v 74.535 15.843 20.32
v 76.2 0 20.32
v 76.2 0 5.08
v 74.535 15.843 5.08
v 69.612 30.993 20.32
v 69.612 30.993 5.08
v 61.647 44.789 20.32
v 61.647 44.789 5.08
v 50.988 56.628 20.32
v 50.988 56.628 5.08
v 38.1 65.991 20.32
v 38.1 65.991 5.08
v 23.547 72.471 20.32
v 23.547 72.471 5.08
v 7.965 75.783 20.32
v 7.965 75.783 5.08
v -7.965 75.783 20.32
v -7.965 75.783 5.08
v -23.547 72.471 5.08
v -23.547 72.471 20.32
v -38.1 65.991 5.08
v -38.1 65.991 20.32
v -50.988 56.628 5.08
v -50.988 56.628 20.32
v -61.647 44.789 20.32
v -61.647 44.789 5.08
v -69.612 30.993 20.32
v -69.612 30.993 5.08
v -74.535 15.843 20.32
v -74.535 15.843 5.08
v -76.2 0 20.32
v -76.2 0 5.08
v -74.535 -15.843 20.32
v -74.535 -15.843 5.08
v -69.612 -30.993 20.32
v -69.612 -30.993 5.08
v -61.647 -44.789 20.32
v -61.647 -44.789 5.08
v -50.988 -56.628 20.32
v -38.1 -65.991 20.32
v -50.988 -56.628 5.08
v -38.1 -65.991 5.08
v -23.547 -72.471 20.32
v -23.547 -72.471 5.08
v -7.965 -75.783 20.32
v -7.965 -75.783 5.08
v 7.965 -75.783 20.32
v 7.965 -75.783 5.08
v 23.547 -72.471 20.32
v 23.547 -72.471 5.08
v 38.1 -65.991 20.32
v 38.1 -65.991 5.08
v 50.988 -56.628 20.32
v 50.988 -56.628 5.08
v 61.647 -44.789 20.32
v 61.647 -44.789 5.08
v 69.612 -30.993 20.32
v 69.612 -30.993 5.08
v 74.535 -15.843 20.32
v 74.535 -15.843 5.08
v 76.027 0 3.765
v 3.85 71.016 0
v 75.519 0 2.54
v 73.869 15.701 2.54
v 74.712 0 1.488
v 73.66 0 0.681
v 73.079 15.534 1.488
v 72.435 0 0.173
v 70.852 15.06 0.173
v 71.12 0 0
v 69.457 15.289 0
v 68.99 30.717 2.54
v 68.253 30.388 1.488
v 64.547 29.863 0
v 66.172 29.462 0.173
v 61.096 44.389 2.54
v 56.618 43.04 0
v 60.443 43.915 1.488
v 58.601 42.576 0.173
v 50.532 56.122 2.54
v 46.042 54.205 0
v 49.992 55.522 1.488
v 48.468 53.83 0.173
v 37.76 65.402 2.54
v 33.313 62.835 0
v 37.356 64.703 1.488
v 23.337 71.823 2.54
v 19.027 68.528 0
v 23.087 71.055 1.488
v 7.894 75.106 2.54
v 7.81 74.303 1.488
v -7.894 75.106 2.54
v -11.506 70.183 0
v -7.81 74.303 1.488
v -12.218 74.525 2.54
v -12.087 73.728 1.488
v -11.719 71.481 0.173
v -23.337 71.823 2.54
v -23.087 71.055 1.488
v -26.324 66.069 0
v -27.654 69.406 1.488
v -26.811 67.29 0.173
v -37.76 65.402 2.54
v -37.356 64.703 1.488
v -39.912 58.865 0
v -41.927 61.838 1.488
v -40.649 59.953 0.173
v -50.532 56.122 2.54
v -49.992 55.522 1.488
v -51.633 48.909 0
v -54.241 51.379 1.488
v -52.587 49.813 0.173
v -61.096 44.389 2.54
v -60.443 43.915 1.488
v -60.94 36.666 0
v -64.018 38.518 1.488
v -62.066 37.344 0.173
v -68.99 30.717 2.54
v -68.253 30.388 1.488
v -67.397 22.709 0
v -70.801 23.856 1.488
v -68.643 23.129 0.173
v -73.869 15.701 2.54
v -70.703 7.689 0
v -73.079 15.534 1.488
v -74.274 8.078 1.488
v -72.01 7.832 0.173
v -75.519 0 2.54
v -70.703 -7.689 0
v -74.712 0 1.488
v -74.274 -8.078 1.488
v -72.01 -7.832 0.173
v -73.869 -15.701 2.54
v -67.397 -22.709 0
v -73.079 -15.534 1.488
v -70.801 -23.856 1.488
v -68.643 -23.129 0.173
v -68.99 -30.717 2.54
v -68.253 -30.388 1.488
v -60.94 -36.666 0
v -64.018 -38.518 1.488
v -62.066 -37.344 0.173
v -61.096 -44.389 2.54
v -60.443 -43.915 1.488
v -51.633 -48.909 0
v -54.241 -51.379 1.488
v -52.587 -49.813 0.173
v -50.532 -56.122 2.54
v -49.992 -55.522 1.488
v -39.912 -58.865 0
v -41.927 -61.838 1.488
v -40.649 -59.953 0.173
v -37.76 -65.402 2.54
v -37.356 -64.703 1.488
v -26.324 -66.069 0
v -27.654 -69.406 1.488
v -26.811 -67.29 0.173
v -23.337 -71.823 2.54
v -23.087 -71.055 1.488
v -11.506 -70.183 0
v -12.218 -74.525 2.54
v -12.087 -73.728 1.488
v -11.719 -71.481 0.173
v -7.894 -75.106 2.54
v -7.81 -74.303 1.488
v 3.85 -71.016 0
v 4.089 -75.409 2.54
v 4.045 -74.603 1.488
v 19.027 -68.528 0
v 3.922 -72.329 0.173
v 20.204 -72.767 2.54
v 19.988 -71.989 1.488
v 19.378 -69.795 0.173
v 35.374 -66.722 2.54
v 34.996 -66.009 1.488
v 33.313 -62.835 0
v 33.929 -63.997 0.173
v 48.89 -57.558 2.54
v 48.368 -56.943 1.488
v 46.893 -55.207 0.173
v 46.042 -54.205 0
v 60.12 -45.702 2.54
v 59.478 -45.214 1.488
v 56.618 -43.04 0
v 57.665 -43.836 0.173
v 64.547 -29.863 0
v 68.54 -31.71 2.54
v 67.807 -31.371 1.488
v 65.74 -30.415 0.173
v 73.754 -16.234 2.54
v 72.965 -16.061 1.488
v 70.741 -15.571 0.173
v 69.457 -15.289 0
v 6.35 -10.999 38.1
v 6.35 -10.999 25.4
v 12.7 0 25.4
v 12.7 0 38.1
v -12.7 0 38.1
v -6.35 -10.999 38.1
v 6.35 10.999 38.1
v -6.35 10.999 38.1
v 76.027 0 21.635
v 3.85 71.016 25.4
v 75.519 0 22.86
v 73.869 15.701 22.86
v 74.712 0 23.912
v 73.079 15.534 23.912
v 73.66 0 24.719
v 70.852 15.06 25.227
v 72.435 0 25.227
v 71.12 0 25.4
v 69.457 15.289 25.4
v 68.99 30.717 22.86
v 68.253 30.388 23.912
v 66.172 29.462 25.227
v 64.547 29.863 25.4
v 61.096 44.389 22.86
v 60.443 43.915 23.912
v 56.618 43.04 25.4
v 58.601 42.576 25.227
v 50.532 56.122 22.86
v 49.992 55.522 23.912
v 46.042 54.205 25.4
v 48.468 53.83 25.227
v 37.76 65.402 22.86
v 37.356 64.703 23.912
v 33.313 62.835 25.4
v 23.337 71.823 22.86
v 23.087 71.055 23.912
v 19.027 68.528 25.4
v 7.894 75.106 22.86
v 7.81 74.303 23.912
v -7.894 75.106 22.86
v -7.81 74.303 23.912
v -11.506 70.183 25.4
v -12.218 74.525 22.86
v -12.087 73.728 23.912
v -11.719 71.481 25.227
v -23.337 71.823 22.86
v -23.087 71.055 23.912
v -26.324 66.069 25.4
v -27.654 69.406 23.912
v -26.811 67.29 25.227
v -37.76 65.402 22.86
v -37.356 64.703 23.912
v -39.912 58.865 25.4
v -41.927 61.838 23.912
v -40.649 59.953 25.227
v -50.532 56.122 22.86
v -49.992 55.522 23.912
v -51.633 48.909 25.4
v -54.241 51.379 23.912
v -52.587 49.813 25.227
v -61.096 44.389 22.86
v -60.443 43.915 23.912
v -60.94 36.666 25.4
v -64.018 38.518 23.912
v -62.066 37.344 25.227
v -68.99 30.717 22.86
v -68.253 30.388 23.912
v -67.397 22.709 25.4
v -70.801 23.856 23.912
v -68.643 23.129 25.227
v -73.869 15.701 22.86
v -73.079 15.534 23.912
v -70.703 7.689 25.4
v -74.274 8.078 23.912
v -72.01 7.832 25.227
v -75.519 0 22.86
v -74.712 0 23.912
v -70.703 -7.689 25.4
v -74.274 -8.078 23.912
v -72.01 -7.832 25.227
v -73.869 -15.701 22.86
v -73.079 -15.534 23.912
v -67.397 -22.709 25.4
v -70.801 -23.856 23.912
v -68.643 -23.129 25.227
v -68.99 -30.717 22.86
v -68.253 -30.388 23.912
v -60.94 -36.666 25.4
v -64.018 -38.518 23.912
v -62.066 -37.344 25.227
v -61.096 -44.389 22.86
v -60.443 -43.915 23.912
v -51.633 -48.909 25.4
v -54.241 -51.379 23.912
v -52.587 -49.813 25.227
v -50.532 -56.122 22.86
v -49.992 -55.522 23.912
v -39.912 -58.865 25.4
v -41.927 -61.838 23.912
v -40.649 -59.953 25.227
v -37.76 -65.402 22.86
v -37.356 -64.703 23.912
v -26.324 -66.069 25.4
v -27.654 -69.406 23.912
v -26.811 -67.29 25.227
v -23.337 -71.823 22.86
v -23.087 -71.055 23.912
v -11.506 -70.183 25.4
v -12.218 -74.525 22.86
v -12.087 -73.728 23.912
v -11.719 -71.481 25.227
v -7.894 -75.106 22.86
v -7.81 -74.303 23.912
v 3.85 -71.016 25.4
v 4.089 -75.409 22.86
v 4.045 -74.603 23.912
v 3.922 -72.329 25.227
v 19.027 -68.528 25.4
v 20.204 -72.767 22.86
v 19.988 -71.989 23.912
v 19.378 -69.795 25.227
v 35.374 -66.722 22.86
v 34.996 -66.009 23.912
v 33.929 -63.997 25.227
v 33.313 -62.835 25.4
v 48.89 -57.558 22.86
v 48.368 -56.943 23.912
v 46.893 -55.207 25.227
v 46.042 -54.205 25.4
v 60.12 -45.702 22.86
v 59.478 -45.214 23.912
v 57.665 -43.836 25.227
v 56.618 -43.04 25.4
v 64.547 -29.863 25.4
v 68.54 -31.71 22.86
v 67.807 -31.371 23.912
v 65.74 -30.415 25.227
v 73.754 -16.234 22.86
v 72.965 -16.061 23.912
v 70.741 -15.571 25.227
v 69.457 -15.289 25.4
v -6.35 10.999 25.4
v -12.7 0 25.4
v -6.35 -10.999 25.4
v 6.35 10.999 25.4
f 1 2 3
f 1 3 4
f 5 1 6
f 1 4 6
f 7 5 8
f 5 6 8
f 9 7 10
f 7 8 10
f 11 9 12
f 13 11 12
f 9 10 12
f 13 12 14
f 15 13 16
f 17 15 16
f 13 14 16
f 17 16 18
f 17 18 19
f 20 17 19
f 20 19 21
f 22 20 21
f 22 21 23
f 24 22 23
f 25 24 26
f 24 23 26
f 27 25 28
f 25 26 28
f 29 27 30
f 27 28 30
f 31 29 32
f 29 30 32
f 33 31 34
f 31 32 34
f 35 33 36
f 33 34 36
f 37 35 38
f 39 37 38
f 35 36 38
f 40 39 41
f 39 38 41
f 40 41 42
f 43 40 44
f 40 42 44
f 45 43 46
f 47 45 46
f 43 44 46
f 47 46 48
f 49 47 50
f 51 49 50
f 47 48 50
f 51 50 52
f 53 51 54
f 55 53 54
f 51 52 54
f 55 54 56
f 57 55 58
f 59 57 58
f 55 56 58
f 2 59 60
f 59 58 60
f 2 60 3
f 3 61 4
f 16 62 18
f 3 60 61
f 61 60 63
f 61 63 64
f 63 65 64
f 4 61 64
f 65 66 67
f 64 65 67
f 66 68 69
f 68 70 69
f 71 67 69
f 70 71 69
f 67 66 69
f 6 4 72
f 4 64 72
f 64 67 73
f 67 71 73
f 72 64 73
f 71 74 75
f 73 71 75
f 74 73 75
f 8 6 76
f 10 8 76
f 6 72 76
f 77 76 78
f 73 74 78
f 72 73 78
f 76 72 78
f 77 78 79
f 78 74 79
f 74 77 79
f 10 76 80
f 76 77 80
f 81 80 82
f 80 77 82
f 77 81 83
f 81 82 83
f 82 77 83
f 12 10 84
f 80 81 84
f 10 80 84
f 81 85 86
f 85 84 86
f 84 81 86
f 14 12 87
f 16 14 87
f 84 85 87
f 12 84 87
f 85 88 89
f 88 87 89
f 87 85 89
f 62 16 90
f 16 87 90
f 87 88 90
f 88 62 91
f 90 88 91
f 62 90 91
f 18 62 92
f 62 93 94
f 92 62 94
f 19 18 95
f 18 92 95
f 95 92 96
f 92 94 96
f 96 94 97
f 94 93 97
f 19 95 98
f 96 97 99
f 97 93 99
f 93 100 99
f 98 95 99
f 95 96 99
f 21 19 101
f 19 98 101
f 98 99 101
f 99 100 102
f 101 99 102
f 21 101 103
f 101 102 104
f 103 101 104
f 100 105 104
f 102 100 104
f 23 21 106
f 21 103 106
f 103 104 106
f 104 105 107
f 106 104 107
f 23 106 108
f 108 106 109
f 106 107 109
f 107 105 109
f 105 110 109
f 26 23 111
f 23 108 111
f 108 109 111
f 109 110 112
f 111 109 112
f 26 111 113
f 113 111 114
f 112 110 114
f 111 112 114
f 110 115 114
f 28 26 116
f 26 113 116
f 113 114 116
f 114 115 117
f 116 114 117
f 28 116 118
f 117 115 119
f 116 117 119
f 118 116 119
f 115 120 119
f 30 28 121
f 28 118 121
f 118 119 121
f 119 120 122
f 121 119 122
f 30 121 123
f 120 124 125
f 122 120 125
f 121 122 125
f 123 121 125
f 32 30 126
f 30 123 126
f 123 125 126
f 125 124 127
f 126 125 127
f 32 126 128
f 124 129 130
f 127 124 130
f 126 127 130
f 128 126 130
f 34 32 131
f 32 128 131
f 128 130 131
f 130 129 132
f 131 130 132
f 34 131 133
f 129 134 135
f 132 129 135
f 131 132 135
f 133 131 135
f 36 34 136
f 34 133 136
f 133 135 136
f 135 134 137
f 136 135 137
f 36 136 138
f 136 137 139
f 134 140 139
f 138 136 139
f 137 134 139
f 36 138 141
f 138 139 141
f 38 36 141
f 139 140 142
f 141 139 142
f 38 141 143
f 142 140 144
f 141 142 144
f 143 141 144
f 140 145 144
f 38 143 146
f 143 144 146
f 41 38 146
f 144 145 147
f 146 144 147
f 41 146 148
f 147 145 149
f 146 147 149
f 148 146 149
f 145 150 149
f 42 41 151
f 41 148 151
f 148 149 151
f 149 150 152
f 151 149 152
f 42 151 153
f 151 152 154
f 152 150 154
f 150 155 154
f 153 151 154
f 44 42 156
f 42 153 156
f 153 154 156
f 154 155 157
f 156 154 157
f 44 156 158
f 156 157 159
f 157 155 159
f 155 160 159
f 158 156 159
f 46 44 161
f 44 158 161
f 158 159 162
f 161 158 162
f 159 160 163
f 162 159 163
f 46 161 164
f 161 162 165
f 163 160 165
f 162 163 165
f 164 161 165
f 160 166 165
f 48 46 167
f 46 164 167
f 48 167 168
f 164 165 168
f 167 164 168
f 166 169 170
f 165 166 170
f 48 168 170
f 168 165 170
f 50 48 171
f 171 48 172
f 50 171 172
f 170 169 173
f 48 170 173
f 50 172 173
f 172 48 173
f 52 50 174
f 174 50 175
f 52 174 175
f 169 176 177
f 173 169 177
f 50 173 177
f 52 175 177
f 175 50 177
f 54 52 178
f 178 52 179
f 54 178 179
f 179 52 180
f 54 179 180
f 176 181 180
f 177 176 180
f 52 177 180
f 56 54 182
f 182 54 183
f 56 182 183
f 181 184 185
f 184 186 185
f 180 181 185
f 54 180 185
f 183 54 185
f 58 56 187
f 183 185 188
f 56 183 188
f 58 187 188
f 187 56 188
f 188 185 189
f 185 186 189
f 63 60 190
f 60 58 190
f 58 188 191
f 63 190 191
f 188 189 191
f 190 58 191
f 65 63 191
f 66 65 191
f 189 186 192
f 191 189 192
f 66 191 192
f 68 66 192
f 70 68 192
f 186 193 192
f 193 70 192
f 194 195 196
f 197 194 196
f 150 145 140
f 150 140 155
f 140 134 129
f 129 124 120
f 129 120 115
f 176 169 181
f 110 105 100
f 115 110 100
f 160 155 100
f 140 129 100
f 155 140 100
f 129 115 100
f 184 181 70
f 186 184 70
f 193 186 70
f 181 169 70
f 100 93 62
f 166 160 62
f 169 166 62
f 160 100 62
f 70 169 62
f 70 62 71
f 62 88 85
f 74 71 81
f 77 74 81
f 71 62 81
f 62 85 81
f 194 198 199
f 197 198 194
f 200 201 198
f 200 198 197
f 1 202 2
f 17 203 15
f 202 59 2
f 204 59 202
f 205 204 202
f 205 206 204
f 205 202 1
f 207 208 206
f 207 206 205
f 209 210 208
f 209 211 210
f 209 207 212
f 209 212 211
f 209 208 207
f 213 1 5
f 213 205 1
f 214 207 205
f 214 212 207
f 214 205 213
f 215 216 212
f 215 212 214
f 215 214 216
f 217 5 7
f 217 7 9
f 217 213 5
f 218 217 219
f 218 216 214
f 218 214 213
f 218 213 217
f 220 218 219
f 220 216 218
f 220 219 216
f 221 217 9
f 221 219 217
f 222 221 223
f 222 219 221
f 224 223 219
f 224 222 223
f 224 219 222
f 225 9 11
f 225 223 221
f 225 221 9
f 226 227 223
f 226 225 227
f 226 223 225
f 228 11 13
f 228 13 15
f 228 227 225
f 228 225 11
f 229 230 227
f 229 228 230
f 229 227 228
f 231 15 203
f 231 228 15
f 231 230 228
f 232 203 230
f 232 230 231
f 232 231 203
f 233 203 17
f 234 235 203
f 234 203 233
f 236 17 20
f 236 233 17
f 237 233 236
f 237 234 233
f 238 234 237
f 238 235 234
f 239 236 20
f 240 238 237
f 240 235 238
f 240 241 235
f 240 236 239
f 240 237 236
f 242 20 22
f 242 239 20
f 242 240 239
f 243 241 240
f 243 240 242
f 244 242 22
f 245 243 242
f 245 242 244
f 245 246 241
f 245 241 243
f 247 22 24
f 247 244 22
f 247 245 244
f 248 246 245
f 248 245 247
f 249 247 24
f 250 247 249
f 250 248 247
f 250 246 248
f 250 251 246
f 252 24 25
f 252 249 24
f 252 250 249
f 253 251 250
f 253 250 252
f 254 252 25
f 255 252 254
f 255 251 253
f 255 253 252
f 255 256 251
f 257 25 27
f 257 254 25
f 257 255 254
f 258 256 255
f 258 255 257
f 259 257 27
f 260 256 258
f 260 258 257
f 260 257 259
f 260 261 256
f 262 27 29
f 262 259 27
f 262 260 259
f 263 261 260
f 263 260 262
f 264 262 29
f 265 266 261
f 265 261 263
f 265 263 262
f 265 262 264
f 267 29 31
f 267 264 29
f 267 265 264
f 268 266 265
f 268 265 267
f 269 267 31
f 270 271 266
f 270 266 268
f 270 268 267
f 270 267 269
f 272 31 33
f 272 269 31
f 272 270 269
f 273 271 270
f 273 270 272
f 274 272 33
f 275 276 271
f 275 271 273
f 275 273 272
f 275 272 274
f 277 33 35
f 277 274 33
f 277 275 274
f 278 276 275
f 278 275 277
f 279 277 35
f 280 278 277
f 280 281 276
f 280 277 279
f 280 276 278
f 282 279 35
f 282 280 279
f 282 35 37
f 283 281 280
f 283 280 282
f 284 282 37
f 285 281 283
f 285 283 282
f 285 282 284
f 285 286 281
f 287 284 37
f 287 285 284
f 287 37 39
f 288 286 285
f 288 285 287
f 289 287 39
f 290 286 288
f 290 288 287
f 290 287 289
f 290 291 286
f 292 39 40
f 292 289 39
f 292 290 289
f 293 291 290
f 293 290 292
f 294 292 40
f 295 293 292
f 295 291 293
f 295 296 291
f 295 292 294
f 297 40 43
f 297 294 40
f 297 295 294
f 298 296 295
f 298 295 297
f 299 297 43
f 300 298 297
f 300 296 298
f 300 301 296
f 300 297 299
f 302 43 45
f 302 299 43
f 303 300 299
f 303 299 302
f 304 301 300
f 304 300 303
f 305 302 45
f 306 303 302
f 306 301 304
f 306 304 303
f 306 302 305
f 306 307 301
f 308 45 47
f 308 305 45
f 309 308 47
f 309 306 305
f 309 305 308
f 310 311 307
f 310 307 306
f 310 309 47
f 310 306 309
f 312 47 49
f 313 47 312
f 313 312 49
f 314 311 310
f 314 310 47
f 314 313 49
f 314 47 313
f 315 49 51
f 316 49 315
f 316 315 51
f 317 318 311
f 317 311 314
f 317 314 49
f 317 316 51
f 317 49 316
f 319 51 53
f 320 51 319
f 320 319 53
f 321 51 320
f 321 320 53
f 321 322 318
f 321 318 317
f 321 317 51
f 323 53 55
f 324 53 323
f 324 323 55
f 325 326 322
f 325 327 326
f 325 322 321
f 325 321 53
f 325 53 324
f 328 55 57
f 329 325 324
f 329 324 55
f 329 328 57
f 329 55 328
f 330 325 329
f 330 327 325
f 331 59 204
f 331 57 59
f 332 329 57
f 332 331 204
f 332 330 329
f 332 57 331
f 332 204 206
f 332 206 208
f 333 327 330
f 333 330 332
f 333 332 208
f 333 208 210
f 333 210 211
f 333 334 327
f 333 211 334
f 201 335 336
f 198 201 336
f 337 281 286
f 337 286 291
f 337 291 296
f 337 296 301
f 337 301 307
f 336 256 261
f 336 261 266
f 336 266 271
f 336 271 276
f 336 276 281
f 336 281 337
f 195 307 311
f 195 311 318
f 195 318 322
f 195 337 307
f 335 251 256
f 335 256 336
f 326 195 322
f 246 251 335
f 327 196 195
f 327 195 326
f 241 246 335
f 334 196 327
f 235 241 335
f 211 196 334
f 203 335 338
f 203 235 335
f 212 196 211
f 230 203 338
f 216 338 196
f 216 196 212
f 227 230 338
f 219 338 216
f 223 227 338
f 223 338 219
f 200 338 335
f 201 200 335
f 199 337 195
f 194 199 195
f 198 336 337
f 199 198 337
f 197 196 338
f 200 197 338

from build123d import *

# Parameters (mm, degrees)
F0_R     = 76.2
F1_DEPTH = 25.4
F2_R     = 5.08
F4_DEPTH = 12.7


with BuildPart() as f1:
    # F0 (on Top) → F1 (new body)
    with BuildSketch(Plane.XY):
        Circle(F0_R)
    extrude(amount=F1_DEPTH)

    # F2
    f2_edges = [f1.edges().sort_by_distance(p)[0] for p in [
        (-76.2, 0, 25.4),
        (-76.2, 0, 0),
    ]]
    fillet(f2_edges, radius=F2_R)

    # F3 (on face) → F4 (join)
    with BuildSketch(Plane.XY.offset(25.4)):
        Polygon((-6.35, -10.998523), (6.35, -10.998523), (12.7, 0), (6.35, 10.998523), (-6.35, 10.998523), (-12.7, 0), align=None)
    extrude(amount=F4_DEPTH)


solid = f1.part
